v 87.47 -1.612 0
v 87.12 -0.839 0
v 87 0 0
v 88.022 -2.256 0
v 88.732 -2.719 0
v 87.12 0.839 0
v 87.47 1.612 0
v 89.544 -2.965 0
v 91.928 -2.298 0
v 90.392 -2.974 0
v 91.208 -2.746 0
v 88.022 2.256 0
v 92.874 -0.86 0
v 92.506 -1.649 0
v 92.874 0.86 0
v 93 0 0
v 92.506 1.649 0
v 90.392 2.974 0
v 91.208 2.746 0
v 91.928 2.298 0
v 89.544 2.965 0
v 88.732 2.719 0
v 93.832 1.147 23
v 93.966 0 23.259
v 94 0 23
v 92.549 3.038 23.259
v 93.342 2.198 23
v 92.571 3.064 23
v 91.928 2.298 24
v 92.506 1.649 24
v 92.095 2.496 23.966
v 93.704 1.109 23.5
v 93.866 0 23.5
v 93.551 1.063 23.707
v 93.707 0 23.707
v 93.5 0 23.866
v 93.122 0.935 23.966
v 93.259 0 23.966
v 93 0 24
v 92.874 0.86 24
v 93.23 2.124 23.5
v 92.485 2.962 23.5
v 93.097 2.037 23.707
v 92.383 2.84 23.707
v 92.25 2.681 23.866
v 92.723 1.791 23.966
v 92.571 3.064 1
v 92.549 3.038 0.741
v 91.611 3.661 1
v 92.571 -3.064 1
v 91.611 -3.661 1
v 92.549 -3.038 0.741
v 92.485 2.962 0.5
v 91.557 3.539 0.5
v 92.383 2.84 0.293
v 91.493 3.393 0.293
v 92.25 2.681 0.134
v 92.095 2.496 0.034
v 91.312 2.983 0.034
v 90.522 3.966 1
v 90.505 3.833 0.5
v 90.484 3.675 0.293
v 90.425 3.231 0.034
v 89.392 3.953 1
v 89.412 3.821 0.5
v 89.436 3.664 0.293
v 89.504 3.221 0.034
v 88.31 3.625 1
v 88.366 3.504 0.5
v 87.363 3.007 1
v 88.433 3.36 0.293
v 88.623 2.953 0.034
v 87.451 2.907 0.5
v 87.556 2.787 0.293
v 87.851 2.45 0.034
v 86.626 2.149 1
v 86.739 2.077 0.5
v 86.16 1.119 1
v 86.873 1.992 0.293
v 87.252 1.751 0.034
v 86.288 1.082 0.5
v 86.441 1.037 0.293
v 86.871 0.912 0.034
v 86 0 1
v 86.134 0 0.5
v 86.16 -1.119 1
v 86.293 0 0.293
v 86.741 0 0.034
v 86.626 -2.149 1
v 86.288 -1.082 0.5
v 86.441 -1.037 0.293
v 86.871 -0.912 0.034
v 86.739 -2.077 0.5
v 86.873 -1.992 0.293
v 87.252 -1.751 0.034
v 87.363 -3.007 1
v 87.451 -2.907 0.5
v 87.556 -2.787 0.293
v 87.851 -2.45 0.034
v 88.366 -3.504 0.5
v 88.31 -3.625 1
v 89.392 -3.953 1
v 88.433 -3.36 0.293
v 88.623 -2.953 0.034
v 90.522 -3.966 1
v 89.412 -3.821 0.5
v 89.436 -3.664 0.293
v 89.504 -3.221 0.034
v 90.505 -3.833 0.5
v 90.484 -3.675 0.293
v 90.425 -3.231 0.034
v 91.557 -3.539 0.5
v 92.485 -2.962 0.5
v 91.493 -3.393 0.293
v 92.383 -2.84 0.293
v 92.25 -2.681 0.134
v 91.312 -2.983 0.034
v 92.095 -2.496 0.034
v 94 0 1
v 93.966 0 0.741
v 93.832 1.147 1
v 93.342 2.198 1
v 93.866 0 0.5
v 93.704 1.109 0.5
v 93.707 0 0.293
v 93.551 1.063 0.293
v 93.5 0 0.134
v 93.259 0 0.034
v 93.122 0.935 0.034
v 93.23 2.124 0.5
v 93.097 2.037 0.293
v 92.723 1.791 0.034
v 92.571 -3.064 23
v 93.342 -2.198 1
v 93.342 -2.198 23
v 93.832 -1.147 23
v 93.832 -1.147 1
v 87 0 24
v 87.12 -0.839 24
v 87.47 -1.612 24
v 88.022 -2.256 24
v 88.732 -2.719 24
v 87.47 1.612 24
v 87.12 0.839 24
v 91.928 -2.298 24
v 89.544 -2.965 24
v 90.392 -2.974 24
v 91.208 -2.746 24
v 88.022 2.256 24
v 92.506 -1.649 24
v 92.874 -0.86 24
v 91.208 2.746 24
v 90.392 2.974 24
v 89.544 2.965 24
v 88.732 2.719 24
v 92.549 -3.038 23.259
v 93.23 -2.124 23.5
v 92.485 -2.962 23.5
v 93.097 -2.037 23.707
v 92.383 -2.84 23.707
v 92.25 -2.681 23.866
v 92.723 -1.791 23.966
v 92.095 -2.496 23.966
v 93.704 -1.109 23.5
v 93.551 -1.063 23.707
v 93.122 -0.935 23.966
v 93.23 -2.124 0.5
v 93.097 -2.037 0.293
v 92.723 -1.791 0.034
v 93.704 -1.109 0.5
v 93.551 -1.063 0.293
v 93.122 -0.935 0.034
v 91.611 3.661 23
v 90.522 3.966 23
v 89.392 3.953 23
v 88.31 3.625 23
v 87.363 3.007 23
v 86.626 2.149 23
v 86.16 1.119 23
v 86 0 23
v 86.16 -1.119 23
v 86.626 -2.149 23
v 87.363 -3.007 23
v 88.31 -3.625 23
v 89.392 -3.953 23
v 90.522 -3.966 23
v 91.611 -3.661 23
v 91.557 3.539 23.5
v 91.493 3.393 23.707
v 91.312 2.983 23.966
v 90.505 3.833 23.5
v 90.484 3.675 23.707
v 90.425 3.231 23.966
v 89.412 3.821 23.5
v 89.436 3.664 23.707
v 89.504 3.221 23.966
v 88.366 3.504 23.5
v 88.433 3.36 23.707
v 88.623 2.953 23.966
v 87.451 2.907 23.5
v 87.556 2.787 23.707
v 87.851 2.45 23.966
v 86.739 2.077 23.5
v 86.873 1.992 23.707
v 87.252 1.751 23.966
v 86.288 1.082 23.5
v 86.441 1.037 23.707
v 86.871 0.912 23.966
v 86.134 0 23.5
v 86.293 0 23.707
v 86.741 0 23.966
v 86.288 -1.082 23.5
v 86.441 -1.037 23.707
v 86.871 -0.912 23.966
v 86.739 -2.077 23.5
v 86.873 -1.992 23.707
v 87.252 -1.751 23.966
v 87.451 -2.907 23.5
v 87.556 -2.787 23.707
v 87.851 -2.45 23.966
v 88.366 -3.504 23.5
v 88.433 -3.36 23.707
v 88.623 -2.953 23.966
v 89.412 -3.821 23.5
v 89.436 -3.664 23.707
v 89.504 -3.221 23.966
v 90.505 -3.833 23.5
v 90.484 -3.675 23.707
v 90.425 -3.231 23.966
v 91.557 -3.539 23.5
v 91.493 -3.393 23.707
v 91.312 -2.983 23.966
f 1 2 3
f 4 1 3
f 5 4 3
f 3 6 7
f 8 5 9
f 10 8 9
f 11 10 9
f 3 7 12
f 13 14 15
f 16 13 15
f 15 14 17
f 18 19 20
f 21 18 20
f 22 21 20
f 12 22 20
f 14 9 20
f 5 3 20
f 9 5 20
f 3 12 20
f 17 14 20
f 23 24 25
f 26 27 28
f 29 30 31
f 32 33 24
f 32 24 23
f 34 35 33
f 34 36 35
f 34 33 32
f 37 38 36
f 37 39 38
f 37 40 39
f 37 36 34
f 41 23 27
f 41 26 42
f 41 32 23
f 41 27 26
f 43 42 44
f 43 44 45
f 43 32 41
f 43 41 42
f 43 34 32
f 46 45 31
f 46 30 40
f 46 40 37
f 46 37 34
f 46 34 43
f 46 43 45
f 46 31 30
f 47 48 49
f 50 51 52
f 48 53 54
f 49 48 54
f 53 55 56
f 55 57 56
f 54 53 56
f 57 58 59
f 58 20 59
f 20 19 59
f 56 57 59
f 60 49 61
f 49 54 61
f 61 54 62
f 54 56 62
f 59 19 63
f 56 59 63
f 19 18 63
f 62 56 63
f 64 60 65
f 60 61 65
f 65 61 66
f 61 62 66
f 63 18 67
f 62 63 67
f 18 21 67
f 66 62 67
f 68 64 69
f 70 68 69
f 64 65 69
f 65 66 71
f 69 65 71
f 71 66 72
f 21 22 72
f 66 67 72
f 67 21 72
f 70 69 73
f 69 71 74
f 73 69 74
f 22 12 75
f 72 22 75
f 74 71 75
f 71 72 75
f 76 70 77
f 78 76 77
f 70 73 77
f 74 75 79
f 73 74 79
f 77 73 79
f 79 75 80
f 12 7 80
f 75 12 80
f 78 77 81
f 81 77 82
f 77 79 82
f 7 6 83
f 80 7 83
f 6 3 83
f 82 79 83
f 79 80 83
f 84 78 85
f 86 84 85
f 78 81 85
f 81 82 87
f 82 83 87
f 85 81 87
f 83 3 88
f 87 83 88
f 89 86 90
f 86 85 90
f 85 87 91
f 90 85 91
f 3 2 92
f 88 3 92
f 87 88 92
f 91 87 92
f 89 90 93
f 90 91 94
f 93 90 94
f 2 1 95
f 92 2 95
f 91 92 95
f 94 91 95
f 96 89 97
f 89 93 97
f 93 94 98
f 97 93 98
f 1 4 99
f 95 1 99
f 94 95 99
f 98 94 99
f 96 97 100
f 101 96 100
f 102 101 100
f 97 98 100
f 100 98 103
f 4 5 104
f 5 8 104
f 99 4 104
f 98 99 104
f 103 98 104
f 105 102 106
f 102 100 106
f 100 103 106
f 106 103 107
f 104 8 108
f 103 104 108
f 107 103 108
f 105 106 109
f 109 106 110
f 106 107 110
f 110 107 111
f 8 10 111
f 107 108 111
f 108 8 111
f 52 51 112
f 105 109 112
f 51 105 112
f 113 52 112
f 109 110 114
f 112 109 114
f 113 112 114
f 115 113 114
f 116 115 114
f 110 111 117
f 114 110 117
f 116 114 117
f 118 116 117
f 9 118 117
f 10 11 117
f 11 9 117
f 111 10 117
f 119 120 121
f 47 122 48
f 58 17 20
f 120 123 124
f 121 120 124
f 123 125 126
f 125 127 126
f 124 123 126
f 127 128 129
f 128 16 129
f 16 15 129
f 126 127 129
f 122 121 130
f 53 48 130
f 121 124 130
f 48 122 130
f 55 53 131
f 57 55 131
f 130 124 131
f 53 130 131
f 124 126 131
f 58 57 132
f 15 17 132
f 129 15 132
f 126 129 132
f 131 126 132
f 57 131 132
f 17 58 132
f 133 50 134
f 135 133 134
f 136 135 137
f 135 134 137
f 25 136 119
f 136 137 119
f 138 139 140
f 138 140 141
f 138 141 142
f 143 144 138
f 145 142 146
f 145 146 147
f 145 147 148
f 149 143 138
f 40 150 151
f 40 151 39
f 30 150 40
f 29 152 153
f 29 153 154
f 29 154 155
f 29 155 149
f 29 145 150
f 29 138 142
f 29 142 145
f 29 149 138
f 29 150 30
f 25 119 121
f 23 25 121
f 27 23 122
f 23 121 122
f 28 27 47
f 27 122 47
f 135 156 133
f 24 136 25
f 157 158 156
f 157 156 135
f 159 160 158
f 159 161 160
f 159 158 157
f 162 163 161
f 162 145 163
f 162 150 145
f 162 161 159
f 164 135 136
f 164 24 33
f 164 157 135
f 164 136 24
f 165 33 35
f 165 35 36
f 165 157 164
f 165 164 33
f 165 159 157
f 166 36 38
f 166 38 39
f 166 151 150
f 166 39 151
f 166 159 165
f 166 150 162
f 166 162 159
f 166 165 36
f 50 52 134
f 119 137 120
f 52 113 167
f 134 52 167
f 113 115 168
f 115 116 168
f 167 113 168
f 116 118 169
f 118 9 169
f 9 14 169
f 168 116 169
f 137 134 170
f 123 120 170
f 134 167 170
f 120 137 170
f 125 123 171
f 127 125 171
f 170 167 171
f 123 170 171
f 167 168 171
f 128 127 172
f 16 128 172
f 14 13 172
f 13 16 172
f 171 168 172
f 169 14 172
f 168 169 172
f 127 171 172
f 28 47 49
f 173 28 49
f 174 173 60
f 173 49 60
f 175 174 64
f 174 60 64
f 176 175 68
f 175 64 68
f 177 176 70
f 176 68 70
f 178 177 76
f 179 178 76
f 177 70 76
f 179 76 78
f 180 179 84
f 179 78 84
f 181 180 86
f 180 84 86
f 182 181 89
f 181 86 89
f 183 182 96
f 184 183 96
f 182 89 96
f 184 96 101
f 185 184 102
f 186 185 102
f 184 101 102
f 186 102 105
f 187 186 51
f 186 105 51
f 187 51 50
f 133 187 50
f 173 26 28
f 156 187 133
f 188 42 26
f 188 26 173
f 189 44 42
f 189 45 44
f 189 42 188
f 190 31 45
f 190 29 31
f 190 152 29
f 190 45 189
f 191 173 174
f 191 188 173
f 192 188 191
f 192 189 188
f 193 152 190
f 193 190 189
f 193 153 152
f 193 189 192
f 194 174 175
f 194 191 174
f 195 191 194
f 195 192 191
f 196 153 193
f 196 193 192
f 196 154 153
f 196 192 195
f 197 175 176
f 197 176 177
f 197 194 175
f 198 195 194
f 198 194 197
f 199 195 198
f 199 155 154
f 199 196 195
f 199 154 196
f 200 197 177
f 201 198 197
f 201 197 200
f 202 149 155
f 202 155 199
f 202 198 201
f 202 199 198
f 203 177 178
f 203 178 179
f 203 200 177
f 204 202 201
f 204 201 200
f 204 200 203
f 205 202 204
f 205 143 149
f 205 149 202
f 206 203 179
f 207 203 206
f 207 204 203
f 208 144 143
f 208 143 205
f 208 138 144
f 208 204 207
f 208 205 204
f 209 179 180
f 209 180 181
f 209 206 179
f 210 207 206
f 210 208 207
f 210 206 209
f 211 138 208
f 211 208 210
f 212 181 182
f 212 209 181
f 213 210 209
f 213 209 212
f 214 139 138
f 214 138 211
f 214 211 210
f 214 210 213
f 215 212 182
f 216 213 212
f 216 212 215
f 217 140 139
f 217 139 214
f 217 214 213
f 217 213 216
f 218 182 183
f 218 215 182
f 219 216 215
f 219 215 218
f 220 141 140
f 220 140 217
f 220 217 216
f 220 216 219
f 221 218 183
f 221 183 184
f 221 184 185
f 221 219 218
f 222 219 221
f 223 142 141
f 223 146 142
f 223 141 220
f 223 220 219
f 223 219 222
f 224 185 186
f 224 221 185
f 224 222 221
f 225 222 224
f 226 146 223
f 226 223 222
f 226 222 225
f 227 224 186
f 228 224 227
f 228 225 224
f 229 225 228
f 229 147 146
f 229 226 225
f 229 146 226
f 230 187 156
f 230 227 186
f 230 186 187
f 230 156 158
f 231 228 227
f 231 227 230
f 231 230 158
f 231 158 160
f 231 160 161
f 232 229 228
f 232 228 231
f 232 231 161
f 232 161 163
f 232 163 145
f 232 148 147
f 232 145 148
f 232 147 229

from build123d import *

# Parameters (mm, degrees)
BOSS_EXTRUDE1_DEPTH = 24
FILLET1_R           = 1


with BuildPart() as part:
    # Sketch1 → Boss-Extrude1 (new body)
    with BuildSketch(Plane.XY):
        with BuildLine():
            ThreePointArc((94, 0), (93.625231148, 1.690473047), (92.571150439, 3.064177772))
            ThreePointArc((92.571150439, 3.064177772), (86, 0), (92.571150439, -3.064177772))
            ThreePointArc((92.571150439, -3.064177772), (93.625231148, -1.690473047), (94, 0))
        make_face()
    extrude(amount=BOSS_EXTRUDE1_DEPTH)

    # Fillet1
    fillet1_edges = [part.edges().sort_by_distance(p)[0] for p in [
        (87.428849561, 3.064177772, 0),
        (87.428849561, 3.064177772, 24),
    ]]
    fillet(fillet1_edges, radius=FILLET1_R)


solid = part.part
